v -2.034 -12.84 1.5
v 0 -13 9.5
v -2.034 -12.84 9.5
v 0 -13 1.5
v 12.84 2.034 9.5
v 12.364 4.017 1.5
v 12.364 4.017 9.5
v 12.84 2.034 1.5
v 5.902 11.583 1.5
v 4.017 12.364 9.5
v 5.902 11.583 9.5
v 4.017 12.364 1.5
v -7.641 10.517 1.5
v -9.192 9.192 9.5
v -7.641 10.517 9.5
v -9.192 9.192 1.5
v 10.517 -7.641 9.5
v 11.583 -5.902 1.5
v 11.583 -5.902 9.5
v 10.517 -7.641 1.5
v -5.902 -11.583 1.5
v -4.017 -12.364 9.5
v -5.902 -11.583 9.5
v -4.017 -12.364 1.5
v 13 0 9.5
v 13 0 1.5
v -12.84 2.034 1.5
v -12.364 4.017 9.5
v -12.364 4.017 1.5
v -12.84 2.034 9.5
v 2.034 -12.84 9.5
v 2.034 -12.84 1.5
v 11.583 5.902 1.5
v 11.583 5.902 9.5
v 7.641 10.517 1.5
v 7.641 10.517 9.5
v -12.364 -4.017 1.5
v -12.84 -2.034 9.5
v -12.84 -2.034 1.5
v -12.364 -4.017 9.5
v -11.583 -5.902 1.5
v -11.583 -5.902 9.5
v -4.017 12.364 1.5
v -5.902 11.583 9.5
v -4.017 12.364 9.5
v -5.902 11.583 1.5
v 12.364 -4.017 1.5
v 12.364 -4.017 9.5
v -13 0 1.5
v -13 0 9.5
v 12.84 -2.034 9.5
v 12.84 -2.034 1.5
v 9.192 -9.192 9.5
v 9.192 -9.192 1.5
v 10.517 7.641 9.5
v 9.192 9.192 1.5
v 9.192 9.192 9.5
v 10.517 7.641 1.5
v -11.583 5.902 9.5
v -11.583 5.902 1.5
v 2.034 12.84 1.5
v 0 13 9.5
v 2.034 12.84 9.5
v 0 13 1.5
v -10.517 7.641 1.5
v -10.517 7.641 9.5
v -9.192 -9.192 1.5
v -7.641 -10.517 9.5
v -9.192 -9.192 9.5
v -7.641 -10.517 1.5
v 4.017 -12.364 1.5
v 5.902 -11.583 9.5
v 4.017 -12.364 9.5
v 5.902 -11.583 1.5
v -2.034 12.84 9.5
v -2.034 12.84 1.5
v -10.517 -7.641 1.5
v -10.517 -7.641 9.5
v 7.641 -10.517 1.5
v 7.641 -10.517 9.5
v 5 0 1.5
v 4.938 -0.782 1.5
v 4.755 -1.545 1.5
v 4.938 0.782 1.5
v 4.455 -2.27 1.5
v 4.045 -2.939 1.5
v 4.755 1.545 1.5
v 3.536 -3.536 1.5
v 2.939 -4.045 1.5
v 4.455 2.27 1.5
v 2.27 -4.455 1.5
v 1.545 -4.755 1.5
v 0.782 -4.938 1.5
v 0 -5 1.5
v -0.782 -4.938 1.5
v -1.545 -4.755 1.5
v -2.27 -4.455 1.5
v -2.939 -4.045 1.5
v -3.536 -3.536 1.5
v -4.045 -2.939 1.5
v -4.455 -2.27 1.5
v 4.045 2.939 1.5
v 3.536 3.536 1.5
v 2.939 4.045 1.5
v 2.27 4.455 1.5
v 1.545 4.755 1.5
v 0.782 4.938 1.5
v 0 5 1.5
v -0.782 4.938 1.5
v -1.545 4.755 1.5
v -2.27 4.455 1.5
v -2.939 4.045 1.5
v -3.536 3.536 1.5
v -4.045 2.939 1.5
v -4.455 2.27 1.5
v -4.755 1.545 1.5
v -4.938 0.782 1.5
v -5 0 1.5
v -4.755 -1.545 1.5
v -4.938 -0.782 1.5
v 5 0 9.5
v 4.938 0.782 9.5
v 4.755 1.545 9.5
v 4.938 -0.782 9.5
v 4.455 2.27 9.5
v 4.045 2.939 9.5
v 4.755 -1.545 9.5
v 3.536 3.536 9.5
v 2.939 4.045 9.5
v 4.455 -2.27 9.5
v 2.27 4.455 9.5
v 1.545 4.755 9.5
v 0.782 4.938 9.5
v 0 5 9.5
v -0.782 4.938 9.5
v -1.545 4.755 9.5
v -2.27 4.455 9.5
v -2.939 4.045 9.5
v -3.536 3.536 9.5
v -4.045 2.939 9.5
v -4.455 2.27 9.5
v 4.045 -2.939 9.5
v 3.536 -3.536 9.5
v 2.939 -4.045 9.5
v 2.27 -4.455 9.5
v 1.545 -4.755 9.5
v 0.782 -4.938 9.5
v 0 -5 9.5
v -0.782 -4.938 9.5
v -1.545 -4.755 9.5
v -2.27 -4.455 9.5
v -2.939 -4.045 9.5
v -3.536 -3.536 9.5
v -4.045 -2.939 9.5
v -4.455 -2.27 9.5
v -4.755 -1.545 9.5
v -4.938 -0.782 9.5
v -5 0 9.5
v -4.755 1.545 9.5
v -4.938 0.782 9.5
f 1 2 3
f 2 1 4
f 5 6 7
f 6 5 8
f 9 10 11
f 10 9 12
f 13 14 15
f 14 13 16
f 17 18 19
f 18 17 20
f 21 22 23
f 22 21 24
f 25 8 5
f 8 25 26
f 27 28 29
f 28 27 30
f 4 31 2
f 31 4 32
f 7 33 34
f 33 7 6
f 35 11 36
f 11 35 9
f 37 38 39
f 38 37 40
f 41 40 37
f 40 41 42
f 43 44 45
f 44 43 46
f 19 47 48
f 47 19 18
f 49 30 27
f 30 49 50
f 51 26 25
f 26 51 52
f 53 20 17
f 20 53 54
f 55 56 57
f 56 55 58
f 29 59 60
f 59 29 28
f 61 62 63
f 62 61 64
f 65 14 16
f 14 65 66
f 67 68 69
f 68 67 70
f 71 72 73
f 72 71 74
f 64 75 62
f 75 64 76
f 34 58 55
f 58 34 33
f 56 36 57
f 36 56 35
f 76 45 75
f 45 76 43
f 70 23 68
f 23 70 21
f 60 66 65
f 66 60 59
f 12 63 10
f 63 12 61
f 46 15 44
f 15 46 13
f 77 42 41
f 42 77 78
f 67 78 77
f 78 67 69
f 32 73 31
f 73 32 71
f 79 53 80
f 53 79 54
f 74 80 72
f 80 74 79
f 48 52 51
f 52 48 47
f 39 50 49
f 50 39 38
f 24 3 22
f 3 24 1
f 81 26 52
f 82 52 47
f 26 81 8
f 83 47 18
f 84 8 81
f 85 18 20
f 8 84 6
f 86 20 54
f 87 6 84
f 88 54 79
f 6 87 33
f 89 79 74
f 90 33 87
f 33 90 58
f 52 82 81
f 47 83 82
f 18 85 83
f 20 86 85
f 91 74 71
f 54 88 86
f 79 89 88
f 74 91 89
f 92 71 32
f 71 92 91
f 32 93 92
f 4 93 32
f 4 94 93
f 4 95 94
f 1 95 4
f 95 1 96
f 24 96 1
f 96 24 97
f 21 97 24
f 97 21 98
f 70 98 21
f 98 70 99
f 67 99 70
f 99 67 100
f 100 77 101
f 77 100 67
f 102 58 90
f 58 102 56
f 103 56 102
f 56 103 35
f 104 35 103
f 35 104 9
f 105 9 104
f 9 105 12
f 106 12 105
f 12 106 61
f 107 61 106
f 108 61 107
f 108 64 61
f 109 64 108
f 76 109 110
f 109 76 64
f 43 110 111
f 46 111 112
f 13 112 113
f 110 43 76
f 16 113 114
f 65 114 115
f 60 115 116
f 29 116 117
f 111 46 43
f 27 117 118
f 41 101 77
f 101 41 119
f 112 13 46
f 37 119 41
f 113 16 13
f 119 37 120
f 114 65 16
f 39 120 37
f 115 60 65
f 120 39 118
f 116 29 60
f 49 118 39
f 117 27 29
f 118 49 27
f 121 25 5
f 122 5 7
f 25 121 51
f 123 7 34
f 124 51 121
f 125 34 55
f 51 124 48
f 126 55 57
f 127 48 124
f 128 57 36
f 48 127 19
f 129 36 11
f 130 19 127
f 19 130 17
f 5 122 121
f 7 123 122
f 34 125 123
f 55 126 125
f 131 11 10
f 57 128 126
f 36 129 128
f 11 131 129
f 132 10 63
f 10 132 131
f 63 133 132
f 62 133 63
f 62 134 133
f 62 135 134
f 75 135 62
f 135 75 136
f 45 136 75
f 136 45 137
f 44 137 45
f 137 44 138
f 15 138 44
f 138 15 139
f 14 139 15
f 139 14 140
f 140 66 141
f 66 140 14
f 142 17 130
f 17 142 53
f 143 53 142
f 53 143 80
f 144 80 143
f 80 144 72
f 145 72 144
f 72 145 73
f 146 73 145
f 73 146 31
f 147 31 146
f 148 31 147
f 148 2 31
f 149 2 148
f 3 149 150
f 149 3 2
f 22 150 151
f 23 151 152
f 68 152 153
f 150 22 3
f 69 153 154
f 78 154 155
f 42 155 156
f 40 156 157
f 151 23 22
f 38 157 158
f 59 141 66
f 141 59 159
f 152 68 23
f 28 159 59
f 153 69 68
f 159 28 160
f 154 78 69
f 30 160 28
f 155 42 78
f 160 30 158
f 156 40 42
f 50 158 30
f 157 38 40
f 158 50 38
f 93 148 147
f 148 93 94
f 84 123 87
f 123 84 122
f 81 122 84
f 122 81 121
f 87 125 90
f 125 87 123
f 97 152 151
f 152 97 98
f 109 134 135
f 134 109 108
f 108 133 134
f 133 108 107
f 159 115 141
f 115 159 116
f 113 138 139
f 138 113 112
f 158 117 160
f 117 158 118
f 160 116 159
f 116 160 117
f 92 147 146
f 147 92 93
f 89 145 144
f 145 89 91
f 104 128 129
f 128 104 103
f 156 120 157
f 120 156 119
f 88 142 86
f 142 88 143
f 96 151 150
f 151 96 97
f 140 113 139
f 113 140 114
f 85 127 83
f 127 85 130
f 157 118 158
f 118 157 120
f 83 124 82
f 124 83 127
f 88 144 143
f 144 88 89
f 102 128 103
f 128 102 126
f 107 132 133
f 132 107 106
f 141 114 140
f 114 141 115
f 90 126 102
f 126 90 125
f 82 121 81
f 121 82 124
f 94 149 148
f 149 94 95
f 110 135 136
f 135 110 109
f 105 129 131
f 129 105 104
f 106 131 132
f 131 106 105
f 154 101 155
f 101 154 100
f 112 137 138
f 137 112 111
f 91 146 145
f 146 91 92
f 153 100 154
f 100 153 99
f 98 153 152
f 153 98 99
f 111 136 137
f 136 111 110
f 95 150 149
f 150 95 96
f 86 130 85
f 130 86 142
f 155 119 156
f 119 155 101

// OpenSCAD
module bearing6000zz(){
	color([0.8,0.8,0.8])difference(){
		cylinder(h=8, r=13, center=true, $fn=40);
		cylinder(h=9, r=5, center=true, $fn=40);	
	}
}


module bf12() {
	color([0.2,0.2,0.2])difference(){
		linear_extrude(height = 20, center = true, convexity = 10, $fn=40)
	   		import (file = "bf12.dxf", layer = "0");
	   	translate([23,-5,0])rotate([90,0,0])cylinder(h=50, r=3.3, center=true, $fn=40);
	   	translate([-23,-5,0])rotate([90,0,0])cylinder(h=50, r=3.3, center=true, $fn=40);
	   	translate([-23,5.6,0])rotate([90,0,0])cylinder(h=4, r=10.8/2, center=true, $fn=40);	
	   	translate([23,5.6,0])rotate([90,0,0])cylinder(h=4, r=10.8/2, center=true, $fn=40);
	}
	translate([0,0,5.5])bearing6000zz();
}

bf12();
